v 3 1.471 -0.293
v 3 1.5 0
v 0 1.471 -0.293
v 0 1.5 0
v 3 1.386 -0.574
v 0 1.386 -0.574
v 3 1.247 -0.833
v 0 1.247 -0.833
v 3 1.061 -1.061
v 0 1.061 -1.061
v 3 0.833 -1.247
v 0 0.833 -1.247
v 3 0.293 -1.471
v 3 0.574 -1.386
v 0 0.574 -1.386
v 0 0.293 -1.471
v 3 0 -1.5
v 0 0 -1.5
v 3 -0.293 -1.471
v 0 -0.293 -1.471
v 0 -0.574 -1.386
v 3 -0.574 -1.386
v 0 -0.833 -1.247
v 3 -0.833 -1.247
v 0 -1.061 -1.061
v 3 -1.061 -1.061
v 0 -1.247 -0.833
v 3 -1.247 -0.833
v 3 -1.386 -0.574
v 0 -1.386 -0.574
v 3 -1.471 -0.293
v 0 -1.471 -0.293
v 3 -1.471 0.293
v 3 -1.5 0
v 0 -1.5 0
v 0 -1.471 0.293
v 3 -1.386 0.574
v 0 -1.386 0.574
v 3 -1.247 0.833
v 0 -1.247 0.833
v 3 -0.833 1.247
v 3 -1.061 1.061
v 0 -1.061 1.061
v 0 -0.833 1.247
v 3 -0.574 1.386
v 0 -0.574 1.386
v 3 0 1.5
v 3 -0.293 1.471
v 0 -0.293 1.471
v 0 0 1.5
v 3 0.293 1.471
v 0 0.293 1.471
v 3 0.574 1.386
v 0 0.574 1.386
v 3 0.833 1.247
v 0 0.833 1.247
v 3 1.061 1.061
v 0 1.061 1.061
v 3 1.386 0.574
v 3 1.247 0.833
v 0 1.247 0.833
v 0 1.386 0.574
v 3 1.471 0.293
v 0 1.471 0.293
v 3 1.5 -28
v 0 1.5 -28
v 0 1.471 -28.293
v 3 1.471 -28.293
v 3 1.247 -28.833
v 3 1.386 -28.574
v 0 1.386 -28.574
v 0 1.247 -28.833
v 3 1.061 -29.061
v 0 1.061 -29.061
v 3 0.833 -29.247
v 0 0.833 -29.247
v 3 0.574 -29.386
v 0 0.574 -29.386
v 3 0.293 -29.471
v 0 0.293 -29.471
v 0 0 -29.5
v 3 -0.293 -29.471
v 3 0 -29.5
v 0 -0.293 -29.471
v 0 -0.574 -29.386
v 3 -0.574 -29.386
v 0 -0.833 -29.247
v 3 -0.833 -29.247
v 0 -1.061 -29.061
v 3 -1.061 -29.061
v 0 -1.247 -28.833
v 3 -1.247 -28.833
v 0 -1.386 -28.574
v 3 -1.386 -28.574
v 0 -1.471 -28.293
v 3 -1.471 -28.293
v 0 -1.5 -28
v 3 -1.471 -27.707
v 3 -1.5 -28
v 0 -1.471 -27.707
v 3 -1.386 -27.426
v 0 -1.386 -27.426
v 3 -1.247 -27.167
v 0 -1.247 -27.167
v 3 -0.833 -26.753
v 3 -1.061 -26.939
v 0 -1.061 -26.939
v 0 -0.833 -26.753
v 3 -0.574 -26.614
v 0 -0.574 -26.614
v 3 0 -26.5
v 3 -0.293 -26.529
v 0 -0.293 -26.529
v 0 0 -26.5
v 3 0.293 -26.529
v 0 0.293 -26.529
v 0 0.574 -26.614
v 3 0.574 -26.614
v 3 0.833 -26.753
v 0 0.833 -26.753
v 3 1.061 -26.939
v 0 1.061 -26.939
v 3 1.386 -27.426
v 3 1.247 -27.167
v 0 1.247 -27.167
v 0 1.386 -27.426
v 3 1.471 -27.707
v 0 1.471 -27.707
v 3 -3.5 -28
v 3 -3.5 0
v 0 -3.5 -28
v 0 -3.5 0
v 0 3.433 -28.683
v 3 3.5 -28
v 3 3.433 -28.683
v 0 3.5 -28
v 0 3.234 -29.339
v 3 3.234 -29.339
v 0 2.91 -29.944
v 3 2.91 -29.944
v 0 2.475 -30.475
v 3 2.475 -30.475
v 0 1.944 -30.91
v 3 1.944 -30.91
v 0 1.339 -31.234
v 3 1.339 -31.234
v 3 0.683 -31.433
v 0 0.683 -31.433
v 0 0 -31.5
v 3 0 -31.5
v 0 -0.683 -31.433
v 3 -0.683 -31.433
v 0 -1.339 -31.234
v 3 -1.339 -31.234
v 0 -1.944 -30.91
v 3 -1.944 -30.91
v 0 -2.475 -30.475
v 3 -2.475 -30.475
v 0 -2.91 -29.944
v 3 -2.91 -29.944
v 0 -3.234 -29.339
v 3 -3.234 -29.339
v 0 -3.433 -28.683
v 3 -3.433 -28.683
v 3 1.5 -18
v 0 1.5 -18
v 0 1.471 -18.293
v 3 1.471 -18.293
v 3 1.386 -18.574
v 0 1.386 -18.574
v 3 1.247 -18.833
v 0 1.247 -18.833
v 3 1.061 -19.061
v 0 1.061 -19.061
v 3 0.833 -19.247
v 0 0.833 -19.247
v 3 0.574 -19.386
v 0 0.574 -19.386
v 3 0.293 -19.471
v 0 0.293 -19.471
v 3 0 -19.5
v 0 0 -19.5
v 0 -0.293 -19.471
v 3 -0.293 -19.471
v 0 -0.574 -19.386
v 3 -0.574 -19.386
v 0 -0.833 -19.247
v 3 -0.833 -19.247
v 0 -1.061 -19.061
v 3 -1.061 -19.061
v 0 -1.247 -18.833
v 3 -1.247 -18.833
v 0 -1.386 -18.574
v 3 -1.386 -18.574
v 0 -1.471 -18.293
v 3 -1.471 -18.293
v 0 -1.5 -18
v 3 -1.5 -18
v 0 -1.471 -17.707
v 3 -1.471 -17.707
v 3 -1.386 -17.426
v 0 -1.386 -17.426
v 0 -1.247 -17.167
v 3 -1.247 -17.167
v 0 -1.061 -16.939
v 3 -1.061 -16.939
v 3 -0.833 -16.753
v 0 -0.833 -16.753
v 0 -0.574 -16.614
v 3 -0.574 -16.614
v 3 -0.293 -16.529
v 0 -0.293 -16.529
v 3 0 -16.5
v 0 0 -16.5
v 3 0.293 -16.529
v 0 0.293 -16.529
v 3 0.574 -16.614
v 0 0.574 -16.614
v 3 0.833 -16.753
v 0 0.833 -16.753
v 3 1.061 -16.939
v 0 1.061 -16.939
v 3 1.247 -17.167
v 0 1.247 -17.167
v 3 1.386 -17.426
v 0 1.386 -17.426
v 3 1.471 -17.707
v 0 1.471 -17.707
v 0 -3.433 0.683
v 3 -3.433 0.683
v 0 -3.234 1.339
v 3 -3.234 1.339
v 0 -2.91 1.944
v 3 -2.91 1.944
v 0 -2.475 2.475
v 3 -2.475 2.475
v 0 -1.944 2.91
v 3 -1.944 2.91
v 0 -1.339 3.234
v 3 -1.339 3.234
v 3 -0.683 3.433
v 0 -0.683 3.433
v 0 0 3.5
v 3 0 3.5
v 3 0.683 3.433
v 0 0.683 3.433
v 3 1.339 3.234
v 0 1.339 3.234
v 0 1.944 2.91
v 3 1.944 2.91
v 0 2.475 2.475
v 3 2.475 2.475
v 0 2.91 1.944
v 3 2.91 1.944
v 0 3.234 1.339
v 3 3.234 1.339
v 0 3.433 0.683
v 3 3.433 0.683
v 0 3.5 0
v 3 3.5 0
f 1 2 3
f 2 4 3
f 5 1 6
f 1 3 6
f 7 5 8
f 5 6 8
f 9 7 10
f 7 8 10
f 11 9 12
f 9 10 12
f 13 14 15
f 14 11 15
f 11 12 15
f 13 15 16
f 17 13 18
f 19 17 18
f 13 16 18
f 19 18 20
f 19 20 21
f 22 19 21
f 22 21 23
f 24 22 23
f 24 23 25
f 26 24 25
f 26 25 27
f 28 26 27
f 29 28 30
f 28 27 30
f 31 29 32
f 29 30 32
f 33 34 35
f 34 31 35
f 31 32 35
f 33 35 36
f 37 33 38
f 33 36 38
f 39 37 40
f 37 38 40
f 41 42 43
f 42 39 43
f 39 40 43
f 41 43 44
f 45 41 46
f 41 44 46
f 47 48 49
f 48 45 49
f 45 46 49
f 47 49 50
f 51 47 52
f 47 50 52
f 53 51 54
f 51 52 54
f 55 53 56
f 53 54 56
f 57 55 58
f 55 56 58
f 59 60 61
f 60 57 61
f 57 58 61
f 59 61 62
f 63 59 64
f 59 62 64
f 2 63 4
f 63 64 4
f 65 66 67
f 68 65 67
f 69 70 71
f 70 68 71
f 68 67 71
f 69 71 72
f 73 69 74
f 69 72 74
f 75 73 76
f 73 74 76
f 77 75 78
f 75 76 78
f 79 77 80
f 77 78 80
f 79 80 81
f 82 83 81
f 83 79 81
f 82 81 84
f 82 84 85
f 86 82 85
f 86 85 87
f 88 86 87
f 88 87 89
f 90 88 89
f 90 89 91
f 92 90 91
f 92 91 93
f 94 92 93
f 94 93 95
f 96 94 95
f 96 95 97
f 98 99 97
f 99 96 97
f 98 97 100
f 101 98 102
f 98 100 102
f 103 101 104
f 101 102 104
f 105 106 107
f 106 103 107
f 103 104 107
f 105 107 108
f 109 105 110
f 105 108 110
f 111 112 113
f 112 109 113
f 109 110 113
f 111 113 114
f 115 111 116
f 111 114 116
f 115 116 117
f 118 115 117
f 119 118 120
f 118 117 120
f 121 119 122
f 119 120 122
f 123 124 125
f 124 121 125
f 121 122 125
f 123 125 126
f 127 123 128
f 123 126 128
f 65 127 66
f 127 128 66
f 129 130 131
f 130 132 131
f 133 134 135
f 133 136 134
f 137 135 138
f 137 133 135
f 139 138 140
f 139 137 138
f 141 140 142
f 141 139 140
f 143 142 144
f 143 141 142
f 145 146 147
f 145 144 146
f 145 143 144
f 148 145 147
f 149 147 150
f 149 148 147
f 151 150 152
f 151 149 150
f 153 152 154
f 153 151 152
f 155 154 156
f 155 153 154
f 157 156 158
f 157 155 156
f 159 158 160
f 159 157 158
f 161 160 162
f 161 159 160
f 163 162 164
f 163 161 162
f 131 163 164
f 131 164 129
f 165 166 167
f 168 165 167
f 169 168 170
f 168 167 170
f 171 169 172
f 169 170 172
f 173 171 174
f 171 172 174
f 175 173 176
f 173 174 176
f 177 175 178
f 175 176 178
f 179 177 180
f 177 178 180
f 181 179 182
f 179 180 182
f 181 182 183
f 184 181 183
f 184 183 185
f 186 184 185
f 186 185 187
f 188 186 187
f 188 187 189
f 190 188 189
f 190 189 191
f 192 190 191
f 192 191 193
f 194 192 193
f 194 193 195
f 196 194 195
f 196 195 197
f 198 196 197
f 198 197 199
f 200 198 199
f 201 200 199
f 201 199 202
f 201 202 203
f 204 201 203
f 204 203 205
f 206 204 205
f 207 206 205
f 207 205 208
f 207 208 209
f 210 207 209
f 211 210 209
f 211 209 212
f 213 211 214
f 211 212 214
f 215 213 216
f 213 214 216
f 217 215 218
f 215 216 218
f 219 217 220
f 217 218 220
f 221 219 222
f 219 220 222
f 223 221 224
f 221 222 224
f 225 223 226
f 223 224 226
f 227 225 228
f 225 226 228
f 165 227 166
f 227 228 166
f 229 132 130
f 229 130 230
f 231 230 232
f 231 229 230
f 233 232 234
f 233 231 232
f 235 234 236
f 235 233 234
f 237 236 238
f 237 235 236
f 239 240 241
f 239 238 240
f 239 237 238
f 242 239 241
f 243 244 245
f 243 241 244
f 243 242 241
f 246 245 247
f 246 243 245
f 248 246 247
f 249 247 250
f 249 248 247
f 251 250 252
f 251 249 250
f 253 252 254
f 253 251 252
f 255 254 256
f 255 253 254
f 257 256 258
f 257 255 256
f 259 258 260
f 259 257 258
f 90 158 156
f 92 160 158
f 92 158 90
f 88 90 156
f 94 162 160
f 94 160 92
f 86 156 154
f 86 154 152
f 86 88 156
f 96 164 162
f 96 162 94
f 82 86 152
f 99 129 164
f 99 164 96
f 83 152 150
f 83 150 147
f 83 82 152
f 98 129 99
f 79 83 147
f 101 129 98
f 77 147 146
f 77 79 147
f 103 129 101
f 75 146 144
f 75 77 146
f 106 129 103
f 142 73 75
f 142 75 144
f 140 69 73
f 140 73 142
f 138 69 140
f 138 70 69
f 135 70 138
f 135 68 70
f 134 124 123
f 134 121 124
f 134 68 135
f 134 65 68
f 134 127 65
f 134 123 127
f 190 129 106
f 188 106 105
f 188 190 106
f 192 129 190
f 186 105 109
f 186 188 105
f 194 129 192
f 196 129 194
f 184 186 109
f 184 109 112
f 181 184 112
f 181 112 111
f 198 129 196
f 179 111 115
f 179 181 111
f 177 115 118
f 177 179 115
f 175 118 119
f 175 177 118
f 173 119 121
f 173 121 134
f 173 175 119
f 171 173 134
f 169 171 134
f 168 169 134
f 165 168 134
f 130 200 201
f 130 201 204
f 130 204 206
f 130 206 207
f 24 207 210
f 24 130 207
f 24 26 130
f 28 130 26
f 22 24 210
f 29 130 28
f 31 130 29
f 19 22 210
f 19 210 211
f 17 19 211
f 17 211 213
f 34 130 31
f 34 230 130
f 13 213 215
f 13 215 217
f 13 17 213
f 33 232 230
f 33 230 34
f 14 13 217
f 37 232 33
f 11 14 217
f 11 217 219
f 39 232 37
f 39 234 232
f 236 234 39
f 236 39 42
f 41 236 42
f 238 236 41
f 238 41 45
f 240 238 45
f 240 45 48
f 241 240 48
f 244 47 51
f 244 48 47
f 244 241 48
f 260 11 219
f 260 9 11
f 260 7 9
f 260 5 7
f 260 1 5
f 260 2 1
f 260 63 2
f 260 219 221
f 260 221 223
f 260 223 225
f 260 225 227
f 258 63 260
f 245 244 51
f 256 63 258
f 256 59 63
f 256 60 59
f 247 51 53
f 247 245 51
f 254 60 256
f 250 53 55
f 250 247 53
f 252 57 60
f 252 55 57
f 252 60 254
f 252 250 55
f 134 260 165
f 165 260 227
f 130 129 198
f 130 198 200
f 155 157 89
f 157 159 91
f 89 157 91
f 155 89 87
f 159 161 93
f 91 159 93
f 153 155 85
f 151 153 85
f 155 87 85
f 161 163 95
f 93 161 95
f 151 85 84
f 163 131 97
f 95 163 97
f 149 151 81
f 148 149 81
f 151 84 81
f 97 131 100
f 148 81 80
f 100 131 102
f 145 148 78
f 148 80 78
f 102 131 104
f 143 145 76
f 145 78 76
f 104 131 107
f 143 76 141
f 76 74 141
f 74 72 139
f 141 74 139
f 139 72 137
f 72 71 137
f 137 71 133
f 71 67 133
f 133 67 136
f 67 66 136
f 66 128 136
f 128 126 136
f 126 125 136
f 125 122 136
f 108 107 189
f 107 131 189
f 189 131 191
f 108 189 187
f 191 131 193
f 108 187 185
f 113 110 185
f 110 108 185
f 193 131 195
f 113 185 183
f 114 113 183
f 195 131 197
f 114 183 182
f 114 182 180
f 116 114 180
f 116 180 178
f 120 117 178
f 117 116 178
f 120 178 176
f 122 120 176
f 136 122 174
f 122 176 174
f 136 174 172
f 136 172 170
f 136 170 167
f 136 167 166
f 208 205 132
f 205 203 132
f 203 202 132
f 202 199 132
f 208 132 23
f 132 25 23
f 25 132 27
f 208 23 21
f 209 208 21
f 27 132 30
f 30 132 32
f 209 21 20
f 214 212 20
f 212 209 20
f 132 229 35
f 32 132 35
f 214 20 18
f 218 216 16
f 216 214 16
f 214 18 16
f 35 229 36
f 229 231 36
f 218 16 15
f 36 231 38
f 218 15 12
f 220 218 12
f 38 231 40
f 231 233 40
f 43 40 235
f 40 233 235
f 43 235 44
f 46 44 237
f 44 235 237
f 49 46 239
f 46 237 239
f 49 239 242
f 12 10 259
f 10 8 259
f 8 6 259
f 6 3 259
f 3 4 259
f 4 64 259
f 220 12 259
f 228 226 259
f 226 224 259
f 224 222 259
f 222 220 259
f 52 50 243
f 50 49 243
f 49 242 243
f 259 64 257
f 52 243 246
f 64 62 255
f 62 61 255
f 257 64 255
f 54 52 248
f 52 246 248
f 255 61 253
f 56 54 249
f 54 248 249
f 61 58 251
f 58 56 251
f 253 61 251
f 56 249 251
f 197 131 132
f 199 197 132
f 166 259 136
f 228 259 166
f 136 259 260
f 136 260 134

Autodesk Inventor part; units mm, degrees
ref_plane "YZ Plane" through (0, 0, 0) normal (1, 0, 0) x (0, 1, 0)
ref_plane "XZ Plane" through (0, 0, 0) normal (0, 1, 0) x (-1, 0, 0)
ref_plane "XY Plane" through (0, 0, 0) normal (0, 0, 1) x (1, 0, 0)
sketch "Sketch1" plane through (0, 0, 0) normal (1, 0, 0) x (0, 1, 0)
  circle A0 centre (0, 0) radius 1.5
  arc A1 (3.5, 0) -> (0, -3.5) centre (0, 0) ccw
  line L0 (0, 0) -> (0, -18)
  circle A2 centre (0, -18) radius 1.5
  line L1 (0, -18) -> (0, -28)
  circle A3 centre (0, -28) radius 1.5
  arc A4 (0, -24.5) -> (3.5, -28) centre (0, -28) ccw
  line L2 (3.5, 0) -> (3.5, -28)
  line L3 (-3.5, 0) -> (-3.5, -28)
  dimension "d0" = 3
  dimension "d1" = 7
  dimension "d2" = 18
  dimension "d3" = 3
  dimension "d4" = 10
  dimension "d5" = 3
  dimension "d6" = 7
extrude "Extrusion1" add sketch "Sketch1" along normal blind 3 contours A1 L2 A4 L1 A2 L0 | L0 A2 L1 A4 L3 A1
properties part number "acople_gripper"
